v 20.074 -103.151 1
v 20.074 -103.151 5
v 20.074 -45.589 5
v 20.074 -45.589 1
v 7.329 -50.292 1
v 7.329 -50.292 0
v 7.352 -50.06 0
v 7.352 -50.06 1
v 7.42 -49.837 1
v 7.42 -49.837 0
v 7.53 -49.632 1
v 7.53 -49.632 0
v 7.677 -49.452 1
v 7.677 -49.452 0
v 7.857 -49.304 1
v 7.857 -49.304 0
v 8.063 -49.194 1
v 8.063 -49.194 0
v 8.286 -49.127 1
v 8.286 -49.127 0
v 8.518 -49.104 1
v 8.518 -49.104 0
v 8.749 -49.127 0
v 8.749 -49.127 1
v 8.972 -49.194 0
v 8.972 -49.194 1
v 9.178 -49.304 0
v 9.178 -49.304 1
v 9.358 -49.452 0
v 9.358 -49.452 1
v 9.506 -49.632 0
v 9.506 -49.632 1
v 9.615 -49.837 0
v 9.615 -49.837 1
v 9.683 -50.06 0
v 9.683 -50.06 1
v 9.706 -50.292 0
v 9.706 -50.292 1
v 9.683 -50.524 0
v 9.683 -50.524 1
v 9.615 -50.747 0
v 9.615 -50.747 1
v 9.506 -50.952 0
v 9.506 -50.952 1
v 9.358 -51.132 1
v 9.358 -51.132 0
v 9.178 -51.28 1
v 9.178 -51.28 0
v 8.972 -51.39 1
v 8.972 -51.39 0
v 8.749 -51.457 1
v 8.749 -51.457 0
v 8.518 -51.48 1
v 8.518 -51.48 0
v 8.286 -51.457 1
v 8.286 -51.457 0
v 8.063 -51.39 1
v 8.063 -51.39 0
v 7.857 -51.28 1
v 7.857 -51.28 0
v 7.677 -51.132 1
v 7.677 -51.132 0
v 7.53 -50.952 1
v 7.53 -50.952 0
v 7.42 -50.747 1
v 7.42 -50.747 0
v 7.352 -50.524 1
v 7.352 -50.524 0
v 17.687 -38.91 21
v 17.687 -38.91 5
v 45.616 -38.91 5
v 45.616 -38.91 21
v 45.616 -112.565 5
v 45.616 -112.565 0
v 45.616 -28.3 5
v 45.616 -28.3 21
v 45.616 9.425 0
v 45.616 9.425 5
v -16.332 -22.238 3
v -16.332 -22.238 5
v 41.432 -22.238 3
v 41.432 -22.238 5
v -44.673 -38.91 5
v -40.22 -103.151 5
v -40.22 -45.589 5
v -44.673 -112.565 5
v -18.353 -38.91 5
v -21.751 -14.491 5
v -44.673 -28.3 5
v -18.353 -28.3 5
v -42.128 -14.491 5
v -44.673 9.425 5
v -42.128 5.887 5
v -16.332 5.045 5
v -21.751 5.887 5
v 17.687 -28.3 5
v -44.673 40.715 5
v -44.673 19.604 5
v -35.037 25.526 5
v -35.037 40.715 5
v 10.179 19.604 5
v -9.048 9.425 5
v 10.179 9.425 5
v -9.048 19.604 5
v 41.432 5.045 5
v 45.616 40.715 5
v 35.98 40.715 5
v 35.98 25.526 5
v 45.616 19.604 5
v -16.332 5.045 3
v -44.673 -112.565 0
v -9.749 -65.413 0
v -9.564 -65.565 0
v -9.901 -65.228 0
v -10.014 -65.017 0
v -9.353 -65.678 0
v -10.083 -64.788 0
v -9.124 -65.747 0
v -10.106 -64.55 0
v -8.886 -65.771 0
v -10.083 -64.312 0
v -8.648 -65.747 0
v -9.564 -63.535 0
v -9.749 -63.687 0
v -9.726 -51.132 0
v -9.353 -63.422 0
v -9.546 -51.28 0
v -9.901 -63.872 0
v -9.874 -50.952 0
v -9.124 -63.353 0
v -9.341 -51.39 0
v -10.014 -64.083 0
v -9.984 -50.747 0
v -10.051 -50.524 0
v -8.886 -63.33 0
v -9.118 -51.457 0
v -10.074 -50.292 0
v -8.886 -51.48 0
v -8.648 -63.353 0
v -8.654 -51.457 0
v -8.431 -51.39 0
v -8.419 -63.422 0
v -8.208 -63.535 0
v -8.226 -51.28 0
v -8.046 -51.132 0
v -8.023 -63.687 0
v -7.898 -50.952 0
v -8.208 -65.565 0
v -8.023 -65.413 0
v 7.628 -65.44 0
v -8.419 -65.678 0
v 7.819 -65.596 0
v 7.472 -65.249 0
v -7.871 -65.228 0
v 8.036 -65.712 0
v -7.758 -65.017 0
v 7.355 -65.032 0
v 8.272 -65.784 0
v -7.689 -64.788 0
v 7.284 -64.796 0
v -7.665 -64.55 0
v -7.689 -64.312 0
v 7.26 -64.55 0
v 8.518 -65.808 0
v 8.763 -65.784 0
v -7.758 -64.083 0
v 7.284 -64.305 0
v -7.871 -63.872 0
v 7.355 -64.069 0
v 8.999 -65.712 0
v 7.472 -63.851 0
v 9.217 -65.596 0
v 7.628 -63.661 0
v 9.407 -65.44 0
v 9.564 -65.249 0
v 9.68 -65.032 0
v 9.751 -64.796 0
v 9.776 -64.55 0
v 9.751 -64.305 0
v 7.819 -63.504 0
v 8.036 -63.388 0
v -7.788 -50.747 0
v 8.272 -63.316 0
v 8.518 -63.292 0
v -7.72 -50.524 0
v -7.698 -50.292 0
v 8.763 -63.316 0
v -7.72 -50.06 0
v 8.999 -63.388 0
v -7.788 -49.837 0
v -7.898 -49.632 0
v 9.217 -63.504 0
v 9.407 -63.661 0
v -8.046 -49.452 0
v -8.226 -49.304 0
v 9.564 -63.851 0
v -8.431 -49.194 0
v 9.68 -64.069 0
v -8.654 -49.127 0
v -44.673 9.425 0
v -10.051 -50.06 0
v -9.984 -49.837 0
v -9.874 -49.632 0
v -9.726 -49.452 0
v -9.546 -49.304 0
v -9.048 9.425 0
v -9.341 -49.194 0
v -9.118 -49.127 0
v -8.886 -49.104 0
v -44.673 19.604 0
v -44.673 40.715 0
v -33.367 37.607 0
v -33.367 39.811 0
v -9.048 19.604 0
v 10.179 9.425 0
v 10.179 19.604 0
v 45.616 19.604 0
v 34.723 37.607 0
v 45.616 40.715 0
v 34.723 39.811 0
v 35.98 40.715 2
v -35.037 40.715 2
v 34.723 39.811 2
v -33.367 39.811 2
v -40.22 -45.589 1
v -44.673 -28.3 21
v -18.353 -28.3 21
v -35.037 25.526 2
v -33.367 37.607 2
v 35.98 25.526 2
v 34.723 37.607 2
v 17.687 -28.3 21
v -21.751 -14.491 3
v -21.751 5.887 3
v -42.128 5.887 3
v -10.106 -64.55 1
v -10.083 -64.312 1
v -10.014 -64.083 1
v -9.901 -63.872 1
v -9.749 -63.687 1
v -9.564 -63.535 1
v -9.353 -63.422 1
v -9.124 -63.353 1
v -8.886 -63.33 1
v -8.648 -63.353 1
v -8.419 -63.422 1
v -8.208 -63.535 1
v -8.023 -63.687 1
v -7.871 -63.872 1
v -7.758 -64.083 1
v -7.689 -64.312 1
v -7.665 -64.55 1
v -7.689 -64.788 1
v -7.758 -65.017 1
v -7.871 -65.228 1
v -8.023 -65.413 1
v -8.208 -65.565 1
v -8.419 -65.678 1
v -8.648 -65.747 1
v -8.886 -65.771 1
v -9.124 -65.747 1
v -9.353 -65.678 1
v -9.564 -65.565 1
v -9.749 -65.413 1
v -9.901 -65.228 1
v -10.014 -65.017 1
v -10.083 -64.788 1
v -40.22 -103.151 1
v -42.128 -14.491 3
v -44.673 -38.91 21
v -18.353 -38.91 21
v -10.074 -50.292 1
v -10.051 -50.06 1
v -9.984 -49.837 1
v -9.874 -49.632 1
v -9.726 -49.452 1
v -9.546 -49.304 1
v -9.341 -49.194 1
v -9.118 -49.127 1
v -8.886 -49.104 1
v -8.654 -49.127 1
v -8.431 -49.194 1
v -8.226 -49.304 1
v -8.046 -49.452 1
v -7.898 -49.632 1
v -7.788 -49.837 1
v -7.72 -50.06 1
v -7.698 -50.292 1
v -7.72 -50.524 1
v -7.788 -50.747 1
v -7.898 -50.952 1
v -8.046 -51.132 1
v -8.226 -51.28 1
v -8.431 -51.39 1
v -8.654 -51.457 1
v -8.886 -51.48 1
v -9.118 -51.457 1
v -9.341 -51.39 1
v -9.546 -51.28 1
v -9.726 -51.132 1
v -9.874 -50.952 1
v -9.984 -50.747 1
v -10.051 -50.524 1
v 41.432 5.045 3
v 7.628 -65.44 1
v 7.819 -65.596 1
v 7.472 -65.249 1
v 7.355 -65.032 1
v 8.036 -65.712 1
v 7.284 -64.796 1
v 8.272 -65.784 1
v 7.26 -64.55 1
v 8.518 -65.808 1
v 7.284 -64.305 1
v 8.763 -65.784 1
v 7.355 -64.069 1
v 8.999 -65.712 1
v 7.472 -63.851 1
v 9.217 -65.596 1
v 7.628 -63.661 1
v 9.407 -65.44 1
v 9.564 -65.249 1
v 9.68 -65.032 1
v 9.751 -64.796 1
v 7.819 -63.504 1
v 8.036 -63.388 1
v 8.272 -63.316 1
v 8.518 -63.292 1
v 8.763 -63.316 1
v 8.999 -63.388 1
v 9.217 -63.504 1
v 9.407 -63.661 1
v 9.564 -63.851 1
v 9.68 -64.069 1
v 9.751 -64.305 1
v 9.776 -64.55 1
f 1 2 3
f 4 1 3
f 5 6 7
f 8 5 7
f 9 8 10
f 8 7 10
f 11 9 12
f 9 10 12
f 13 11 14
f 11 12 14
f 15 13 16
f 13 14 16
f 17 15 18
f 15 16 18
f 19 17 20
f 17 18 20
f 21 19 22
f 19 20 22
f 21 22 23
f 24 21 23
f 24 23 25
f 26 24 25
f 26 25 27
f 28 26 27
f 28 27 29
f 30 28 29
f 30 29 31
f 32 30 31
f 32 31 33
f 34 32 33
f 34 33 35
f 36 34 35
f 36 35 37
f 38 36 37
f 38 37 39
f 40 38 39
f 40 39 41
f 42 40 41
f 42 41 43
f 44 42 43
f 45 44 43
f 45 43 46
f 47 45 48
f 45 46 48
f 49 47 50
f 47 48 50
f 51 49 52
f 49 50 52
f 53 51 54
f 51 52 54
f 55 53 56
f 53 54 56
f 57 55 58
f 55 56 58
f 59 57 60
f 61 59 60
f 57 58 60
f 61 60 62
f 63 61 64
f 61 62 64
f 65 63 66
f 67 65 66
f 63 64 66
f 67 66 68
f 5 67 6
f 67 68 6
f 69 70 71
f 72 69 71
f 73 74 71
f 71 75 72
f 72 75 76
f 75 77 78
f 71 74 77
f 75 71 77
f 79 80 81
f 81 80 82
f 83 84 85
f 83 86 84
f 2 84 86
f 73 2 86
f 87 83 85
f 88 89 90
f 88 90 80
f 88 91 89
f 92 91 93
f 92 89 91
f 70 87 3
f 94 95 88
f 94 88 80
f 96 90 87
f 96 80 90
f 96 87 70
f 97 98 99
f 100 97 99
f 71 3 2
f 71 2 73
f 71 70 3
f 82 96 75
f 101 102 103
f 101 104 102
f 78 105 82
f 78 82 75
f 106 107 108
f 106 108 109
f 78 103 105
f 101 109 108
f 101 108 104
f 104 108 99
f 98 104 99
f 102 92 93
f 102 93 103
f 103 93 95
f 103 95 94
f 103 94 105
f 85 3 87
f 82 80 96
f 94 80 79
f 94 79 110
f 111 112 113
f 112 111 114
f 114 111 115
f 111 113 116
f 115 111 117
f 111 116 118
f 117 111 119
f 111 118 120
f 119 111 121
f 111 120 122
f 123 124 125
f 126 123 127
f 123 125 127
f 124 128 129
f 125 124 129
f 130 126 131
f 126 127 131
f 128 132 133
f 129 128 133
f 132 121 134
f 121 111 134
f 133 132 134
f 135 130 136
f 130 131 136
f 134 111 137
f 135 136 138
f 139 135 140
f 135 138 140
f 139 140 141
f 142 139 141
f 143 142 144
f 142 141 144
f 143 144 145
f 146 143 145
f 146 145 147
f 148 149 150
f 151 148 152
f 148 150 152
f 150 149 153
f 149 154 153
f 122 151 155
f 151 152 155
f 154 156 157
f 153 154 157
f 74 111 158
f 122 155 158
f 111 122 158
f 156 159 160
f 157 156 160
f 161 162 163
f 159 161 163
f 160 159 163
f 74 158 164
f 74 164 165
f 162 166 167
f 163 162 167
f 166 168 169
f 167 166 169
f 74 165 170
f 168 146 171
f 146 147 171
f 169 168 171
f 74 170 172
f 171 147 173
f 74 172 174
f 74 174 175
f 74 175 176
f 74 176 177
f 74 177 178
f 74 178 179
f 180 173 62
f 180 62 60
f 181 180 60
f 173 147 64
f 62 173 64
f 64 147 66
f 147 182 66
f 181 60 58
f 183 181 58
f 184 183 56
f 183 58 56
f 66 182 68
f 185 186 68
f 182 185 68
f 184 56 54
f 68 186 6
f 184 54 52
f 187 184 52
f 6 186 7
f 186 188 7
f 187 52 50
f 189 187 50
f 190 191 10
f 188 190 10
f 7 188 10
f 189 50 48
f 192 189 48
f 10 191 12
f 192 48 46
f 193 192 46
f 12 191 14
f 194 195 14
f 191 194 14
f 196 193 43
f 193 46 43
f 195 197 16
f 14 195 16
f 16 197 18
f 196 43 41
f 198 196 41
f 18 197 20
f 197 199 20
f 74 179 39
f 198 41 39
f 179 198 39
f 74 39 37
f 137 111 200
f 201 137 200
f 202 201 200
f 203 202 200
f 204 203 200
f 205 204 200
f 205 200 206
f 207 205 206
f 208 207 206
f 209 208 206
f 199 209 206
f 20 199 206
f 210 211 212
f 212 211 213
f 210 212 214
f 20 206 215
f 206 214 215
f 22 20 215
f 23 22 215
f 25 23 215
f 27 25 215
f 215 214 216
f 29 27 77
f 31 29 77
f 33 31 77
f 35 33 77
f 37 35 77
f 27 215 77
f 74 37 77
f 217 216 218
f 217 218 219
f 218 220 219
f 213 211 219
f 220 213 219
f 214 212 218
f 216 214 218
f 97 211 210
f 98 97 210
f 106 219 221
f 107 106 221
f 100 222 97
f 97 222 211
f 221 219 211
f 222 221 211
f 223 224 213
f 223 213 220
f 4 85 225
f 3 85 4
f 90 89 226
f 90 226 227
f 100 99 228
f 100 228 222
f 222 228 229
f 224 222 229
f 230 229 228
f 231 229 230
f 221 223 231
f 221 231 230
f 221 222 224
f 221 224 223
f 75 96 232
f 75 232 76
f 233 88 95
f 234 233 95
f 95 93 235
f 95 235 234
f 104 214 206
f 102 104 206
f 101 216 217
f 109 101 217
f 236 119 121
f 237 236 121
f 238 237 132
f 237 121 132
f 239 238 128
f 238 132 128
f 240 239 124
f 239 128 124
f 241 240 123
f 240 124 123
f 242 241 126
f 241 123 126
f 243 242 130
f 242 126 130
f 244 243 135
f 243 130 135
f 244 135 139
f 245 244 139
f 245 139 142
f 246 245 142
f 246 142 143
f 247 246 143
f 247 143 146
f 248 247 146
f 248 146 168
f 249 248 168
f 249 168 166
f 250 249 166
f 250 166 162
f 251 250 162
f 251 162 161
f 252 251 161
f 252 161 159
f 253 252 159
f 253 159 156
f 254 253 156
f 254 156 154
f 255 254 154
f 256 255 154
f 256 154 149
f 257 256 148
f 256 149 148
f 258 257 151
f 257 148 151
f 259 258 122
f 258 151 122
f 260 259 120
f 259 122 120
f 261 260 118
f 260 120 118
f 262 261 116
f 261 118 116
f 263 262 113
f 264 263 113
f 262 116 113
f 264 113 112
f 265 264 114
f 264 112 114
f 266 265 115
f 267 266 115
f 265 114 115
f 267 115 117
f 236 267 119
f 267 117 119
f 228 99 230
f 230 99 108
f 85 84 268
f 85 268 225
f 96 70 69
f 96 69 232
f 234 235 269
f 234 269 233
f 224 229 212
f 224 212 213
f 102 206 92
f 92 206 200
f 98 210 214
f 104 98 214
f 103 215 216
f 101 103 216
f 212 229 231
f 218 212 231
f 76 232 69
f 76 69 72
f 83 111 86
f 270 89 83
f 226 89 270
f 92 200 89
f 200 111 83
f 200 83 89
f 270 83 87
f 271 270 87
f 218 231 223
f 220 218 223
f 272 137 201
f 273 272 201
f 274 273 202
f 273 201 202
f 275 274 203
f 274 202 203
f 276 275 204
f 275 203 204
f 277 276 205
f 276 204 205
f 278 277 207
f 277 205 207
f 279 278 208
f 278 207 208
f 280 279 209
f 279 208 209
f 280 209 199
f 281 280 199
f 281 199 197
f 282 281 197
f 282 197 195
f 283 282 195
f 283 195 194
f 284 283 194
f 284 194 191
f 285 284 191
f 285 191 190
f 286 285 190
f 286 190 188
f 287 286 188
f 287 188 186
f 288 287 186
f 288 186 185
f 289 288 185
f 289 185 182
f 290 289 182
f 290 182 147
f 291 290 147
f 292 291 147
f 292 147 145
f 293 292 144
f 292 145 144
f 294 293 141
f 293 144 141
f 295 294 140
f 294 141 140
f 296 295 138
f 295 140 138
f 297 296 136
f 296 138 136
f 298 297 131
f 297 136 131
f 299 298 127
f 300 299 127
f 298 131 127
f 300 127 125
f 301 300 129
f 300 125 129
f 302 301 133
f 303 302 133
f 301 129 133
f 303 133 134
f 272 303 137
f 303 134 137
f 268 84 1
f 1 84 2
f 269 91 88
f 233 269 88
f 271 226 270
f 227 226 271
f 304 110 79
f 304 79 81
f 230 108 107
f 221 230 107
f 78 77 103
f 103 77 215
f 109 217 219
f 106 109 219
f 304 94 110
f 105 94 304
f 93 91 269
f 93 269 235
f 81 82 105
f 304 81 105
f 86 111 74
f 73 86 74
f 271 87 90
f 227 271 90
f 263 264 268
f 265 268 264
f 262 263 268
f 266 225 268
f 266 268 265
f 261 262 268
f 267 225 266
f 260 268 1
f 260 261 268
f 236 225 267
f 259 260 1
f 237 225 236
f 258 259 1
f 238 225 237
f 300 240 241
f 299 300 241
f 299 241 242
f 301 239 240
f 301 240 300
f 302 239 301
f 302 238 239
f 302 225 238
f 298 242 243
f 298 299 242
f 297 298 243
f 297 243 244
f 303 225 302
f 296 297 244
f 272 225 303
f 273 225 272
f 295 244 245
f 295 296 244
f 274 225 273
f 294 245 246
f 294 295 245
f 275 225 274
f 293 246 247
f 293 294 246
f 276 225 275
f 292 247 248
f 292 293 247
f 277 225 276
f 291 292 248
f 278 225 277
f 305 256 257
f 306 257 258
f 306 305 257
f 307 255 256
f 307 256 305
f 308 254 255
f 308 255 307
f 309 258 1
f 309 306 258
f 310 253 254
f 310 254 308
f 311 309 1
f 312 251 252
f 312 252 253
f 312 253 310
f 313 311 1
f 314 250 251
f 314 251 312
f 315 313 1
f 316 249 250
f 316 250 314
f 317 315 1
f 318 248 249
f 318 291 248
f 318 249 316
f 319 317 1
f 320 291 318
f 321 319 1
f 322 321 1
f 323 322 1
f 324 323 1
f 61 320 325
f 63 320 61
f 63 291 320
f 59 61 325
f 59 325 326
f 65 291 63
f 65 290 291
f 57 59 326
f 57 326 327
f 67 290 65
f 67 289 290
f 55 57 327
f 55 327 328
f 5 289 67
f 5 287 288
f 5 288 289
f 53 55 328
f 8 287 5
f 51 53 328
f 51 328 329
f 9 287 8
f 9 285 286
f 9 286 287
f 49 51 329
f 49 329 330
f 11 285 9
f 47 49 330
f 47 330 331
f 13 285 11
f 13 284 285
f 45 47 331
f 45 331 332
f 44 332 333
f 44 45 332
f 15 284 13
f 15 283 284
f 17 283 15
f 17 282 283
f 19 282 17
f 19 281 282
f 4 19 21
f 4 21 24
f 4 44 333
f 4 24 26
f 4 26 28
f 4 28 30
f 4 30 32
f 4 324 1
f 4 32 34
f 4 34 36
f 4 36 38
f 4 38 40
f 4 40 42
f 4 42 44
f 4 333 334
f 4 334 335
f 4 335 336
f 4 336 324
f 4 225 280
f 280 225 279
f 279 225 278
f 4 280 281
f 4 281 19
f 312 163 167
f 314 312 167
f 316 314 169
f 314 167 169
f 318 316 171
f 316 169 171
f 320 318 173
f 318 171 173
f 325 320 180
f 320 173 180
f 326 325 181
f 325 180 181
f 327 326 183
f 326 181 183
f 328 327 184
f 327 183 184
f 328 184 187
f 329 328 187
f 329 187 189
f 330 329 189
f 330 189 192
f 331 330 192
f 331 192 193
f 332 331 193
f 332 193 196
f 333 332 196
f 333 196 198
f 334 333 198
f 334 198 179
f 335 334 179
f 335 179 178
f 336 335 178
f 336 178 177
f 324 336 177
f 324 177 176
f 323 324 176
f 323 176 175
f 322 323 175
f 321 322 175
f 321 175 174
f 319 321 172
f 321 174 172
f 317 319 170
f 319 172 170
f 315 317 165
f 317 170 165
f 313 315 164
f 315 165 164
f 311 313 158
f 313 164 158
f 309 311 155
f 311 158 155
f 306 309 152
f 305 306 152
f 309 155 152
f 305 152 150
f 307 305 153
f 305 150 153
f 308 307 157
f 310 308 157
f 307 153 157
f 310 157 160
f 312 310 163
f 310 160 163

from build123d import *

# Parameters (mm, degrees)
BASE_DEPTH                = 5
ESBO_O2_W                 = 71.017341725
ESBO_O2_H                 = 15.188699459
SENSOR_DEPTH              = 3
EXTENS_O_BASE_BY          = 41.124942484
ESBO_O3_W                 = 68.089828176
ESBO_O3_H                 = 2.204794608
FURO_SENSOR_DEPTH         = 10
ESBO_O5_R                 = 1.188185025
ESBO_O5_R_2               = 1.258078261
ESBO_O5_R_3               = 1.220632904
CONECTOR_RODA_BAMBA_DEPTH = 10
ESBO_O8_W                 = 20.37740853
ESBO_O8_H                 = 20.377408531
PONTE_H_DEPTH             = 2
ESBO_O10_W                = 57.764058892
ESBO_O10_H                = 27.282150264
ESP_DEPTH                 = 2
ESBO_O11_W                = 27.929189737
ESBO_O11_H                = 10.609725103
ESBO_O11_W_2              = 26.320868842
RESSALTO_EXTRUS_O2_DEPTH  = 16
ESBO_O13_W                = 60.293581274
ESBO_O13_H                = 57.562513133
CORTE_EXTRUS_O12_DEPTH    = 4


with BuildPart() as part:
    # Esboço1 → base (new body)
    with BuildSketch(Plane.XY):
        Polygon((-44.67348187, 40.715072084), (-44.67348187, 19.603553226), (-9.047793796, 19.603553226), (-9.047793796, 9.424785205), (-44.67348187, 9.424785205), (-44.67348187, -71.439871851), (45.61596039, -71.439871851), (45.61596039, 9.424785205), (10.178768021, 9.424785205), (10.178768021, 19.603553226), (45.61596039, 19.603553226), (45.61596039, 40.715072084), align=None)
    extrude(amount=BASE_DEPTH)

    # Esboço2 → sensor (cut)
    with BuildSketch(Plane.XY.offset(5)):
        with Locations((0.47123926, 33.120722355)):
            Rectangle(ESBO_O2_W, ESBO_O2_H)
    extrude(amount=-SENSOR_DEPTH, mode=Mode.SUBTRACT)

    # extensão base: a face moved outward by 41.124942
    extrude(part.faces().sort_by_distance((0.47123926, -71.439871851, 2.5))[0], amount=EXTENS_O_BASE_BY, dir=(0, -1, 0))

    # Esboço3 → "furo" sensor (cut)
    with BuildSketch(Plane.XY.offset(2)):
        with Locations((0.67810757, 38.709026673)):
            Rectangle(ESBO_O3_W, ESBO_O3_H)
    extrude(amount=-FURO_SENSOR_DEPTH, mode=Mode.SUBTRACT)

    # Esboço5 → conector roda bamba (cut)
    with BuildSketch(Plane(origin=(0, 0, 0), x_dir=(-1, 0, 0), z_dir=(0, 0, -1))):
        with Locations((-8.517583176, -50.2919249)):
            Circle(ESBO_O5_R)
        with Locations((-8.517583176, -64.550145197)):
            Circle(ESBO_O5_R_2)
        with Locations((8.885832774, -64.550145197)):
            Circle(ESBO_O5_R_3)
        with Locations((8.885832774, -50.2919249)):
            Circle(ESBO_O5_R)
    extrude(amount=-CONECTOR_RODA_BAMBA_DEPTH, mode=Mode.SUBTRACT)

    # Esboço8 → ponte H (cut)
    with BuildSketch(Plane.XY.offset(5)):
        with Locations((-31.939333104, -4.30205468)):
            Rectangle(ESBO_O8_W, ESBO_O8_H)
    extrude(amount=-PONTE_H_DEPTH, mode=Mode.SUBTRACT)

    # Esboço10 → esp (cut)
    with BuildSketch(Plane.XY.offset(5)):
        with Locations((12.550316437, -8.596467221)):
            Rectangle(ESBO_O10_W, ESBO_O10_H)
    extrude(amount=-ESP_DEPTH, mode=Mode.SUBTRACT)

    # Esboço11 → Ressalto-extrusão2 (add)
    with BuildSketch(Plane.XY.offset(5)):
        with Locations((31.651365522, -33.605104963)):
            Rectangle(ESBO_O11_W, ESBO_O11_H)
        with Locations((-31.513047449, -33.605104963)):
            Rectangle(ESBO_O11_W_2, ESBO_O11_H)
    extrude(amount=RESSALTO_EXTRUS_O2_DEPTH)

    # Esboço13 → Corte-extrusão12 (cut)
    with BuildSketch(Plane.XY.offset(5)):
        with Locations((-10.073047237, -74.36990727)):
            Rectangle(ESBO_O13_W, ESBO_O13_H)
    extrude(amount=-CORTE_EXTRUS_O12_DEPTH, mode=Mode.SUBTRACT)


solid = part.part
